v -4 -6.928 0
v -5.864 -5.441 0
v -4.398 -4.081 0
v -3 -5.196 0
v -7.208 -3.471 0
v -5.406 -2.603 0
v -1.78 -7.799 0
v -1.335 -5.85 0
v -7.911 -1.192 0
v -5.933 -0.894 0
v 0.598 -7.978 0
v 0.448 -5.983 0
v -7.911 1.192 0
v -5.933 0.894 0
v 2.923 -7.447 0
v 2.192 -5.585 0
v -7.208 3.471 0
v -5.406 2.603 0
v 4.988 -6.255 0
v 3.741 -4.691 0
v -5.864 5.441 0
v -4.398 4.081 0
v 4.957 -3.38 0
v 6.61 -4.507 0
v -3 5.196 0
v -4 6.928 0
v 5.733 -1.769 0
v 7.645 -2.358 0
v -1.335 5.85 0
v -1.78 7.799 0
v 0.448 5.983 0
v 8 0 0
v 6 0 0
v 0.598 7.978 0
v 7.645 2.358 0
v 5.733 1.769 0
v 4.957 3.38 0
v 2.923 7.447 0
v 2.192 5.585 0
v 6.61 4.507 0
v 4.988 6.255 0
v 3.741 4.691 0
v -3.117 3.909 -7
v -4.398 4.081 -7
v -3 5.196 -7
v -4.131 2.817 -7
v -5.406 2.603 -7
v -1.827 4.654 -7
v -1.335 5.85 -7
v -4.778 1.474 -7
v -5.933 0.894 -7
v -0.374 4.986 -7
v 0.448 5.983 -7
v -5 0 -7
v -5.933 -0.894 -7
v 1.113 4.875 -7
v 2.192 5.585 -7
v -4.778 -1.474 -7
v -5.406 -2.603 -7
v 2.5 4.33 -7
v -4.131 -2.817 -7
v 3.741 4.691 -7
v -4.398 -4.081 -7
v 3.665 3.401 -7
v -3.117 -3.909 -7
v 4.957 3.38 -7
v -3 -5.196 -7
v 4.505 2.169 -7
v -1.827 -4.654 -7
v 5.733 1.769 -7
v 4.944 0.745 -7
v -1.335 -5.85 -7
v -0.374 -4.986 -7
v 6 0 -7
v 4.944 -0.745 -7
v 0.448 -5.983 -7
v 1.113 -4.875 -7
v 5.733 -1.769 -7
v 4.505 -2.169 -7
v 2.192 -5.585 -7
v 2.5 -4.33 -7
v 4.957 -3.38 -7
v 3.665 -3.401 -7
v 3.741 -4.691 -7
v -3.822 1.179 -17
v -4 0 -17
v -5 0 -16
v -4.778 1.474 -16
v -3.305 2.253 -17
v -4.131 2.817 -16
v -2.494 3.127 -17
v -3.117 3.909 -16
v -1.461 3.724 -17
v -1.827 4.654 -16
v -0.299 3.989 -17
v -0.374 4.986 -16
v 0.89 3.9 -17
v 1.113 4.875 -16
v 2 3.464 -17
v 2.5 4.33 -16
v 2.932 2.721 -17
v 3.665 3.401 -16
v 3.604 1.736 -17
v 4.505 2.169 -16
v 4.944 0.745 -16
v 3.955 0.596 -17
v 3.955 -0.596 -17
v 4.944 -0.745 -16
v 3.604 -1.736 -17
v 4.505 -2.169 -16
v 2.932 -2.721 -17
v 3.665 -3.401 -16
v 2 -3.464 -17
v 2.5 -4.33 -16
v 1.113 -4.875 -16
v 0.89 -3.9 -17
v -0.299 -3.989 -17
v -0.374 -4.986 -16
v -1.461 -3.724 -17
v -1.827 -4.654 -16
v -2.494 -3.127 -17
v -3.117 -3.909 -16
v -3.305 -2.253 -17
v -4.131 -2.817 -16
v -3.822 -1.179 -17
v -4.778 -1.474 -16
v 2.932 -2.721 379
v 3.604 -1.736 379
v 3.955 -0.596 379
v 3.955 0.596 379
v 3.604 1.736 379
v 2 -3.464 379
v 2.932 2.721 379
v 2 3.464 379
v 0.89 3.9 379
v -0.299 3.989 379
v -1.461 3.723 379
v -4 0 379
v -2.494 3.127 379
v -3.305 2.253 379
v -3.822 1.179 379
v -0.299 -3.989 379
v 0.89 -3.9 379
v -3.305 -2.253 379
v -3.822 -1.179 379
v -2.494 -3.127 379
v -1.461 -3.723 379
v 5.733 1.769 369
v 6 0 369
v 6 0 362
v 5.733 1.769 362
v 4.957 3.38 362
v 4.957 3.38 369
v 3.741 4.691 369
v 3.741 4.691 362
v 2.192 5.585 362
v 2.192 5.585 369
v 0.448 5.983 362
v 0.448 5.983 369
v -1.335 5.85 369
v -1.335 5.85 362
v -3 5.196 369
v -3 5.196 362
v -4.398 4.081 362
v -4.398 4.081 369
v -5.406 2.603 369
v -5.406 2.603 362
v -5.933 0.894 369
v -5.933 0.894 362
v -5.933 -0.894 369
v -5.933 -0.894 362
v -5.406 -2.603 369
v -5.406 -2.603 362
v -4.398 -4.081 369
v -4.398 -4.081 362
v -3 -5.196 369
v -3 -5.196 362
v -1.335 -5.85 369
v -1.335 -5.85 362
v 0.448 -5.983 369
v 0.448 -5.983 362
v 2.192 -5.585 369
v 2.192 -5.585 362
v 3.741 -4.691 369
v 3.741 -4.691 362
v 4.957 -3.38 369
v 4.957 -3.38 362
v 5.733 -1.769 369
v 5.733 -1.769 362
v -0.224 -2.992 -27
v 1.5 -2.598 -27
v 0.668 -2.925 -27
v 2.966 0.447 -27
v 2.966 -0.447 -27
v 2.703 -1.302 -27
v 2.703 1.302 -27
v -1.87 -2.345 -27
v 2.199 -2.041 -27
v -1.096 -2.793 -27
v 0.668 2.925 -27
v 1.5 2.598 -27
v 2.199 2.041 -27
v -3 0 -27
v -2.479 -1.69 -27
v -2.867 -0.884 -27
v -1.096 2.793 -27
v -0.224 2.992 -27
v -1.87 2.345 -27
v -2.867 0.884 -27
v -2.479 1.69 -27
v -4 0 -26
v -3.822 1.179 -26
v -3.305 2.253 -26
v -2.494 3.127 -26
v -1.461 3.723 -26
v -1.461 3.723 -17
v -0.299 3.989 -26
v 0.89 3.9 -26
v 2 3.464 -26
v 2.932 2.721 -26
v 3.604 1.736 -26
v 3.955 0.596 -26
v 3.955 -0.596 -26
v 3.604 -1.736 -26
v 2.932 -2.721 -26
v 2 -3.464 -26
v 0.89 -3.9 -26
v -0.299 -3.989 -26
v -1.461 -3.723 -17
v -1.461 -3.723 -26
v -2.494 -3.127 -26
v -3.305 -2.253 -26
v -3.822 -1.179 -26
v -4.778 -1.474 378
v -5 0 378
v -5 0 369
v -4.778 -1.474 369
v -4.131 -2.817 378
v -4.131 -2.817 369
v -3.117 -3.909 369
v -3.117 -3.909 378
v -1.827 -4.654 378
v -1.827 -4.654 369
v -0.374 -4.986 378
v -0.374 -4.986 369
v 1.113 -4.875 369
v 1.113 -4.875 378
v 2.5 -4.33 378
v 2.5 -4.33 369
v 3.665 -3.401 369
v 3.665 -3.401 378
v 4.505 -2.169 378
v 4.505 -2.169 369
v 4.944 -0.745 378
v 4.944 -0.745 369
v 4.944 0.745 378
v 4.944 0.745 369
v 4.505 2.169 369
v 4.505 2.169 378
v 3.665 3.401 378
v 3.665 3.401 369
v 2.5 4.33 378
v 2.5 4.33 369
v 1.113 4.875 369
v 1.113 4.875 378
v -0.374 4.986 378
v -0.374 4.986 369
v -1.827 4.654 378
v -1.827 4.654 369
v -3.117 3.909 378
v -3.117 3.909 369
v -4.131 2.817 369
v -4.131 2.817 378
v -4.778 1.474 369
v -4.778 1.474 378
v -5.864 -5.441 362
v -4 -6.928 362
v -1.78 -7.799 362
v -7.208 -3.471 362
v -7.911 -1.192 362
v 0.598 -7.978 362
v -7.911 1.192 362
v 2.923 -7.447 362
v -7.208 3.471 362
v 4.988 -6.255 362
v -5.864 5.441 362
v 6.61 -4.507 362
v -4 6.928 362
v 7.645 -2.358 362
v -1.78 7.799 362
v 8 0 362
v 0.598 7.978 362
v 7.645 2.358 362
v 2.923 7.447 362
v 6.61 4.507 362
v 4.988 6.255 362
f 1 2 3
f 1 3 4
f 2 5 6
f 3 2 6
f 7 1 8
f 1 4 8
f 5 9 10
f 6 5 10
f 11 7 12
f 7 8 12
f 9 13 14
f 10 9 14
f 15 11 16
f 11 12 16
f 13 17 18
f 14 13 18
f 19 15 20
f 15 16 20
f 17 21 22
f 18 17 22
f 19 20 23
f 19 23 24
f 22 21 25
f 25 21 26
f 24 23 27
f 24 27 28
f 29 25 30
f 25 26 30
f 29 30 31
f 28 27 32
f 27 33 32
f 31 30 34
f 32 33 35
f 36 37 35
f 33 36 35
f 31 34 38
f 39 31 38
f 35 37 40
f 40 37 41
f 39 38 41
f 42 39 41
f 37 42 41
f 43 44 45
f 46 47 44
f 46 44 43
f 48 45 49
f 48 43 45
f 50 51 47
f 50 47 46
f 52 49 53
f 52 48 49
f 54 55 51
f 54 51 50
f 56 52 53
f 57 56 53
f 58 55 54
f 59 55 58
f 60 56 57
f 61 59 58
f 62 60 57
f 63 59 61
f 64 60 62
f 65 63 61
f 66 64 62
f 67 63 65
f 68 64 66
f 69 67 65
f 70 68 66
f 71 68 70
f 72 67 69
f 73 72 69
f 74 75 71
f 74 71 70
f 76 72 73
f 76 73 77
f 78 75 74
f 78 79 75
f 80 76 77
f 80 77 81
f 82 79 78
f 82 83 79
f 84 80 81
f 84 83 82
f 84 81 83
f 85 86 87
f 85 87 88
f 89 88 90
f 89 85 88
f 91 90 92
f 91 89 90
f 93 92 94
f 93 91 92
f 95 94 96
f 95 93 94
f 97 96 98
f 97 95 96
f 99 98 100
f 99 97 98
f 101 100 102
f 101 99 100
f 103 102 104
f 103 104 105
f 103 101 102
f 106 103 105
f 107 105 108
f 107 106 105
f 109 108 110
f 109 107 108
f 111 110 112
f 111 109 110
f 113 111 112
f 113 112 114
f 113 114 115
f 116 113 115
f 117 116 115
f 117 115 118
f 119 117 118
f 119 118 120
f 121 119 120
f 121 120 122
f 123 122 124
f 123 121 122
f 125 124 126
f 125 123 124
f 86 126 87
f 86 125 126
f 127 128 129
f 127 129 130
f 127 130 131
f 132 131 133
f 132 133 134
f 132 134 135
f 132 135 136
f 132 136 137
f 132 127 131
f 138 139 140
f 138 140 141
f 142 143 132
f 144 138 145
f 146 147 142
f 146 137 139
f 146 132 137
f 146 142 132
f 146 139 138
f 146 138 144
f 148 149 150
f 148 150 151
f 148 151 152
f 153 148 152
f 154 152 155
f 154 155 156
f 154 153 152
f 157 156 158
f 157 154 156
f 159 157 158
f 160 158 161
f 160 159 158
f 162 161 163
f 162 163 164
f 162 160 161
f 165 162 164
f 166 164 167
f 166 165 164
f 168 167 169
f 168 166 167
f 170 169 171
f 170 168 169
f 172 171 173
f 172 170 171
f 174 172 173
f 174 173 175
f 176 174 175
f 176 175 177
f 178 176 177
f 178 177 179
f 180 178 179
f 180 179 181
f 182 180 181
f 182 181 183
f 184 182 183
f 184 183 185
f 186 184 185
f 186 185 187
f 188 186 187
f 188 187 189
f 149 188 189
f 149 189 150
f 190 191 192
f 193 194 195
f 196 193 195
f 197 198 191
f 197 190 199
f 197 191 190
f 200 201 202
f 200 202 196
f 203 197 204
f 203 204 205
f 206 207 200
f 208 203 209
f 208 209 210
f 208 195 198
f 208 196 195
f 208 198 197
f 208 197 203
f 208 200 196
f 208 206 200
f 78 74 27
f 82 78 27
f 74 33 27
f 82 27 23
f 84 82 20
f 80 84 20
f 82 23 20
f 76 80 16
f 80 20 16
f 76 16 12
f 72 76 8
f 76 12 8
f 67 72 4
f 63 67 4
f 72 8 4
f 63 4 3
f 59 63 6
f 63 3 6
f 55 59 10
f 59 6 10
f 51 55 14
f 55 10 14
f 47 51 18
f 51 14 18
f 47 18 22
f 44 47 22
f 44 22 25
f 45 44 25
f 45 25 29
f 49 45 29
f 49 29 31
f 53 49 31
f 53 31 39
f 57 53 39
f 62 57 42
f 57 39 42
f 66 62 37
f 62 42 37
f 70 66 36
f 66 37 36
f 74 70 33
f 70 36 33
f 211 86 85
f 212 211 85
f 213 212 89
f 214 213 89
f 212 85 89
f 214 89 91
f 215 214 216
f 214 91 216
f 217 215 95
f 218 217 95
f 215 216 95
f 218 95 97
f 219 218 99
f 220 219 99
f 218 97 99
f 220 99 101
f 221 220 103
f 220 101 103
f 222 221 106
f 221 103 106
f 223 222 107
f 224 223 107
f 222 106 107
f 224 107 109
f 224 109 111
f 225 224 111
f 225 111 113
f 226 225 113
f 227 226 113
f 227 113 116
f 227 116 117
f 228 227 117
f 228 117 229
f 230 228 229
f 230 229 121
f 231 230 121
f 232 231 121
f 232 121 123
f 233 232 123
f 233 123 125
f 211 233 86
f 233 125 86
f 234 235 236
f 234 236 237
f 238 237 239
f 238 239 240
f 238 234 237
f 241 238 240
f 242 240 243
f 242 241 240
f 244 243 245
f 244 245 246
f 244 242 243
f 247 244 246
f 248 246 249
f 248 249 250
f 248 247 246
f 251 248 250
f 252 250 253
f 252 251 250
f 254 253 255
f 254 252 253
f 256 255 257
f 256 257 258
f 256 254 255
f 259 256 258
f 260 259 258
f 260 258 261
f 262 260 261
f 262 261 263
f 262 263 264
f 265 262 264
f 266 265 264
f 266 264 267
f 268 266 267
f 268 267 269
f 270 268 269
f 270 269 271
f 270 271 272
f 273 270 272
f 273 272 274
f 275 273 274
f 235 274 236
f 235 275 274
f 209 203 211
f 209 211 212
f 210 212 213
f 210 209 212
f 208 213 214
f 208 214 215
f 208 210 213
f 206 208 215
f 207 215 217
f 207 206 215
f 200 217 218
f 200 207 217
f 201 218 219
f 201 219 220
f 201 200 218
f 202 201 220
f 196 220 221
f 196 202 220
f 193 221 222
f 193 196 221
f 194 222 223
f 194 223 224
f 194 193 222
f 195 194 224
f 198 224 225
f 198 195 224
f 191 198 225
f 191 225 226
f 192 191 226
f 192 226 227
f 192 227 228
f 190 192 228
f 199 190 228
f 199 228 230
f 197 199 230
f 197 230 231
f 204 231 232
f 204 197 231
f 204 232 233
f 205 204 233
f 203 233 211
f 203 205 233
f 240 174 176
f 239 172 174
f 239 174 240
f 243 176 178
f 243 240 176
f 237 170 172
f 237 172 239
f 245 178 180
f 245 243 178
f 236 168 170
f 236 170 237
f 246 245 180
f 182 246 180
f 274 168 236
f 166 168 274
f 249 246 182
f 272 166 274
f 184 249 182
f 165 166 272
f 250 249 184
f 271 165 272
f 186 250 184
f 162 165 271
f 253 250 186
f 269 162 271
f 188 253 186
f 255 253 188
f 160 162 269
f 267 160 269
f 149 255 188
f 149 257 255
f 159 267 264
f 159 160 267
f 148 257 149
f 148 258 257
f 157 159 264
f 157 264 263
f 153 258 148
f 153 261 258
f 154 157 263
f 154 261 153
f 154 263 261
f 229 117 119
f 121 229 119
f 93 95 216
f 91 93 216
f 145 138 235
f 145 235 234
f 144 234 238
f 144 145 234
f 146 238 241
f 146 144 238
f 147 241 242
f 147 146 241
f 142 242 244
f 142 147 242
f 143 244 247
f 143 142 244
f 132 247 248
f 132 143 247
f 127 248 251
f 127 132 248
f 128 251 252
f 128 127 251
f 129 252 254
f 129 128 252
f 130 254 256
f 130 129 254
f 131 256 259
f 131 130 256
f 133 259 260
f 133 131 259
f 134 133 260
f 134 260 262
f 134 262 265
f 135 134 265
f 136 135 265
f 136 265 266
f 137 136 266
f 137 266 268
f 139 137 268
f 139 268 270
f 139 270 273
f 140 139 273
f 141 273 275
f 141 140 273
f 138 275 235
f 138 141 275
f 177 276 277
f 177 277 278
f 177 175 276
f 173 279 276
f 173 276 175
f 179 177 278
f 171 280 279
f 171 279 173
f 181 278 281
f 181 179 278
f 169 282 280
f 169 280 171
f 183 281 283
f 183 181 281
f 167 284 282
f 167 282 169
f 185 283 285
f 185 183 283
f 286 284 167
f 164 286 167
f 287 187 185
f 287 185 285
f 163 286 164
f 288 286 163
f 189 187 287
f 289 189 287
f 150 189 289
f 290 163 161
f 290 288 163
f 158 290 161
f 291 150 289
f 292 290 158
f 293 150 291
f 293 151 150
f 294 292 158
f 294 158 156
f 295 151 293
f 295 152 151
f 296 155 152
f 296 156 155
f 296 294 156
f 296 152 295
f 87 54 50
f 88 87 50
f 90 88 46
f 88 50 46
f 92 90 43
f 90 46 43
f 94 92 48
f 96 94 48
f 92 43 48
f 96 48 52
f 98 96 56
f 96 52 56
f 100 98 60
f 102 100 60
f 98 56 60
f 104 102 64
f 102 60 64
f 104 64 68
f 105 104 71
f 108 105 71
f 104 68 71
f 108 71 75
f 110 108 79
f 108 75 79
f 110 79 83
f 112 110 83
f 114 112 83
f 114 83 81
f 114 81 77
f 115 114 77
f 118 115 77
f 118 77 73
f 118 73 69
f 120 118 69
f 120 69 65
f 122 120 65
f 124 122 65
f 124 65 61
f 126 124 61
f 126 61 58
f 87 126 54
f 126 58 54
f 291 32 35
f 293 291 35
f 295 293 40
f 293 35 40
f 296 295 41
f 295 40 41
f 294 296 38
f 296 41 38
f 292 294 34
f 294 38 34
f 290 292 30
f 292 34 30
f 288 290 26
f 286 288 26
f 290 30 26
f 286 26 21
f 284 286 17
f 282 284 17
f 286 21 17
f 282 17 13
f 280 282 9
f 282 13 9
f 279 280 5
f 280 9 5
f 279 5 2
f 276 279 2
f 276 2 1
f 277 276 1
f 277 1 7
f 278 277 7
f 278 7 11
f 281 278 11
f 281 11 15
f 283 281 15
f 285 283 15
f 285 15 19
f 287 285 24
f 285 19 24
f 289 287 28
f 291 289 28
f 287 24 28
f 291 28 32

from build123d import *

# Parameters (mm, degrees)
SKETCH1_R           = 8
BOSS_EXTRUDE1_DEPTH = 362
SKETCH6_R           = 6
BOSS_EXTRUDE2_DEPTH = 5
SKETCH7_R           = 6
BOSS_EXTRUDE3_DEPTH = 2
SKETCH8_R           = 5
BOSS_EXTRUDE4_DEPTH = 10
SKETCH9_R           = 4
BOSS_EXTRUDE5_DEPTH = 10
CHAMFER1_SIZE       = 1
CHAMFER2_SIZE       = 1
BOSS_EXTRUDE6_START = 5
SKETCH10_R          = 6
BOSS_EXTRUDE6_DEPTH = 5
BOSS_EXTRUDE7_START = 2
SKETCH11_R          = 6
BOSS_EXTRUDE7_DEPTH = 2
BOSS_EXTRUDE8_START = 10
SKETCH12_R          = 5
BOSS_EXTRUDE8_DEPTH = 10
CHAMFER3_SIZE       = 1


with BuildPart() as part:
    # Sketch1 → Boss-Extrude1 (new body)
    with BuildSketch(Plane.XY):
        Circle(SKETCH1_R)
    extrude(amount=BOSS_EXTRUDE1_DEPTH)

    # Sketch6 → Boss-Extrude2 (add)
    with BuildSketch(Plane(origin=(0, 0, 0), x_dir=(-1, 0, 0), z_dir=(0, 0, -1))):
        with Locations(Location((0, 0, 0), (0, 0, 180))):
            Circle(SKETCH6_R)
    extrude(amount=BOSS_EXTRUDE2_DEPTH)

    # Sketch7 → Boss-Extrude3 (add)
    with BuildSketch(Plane(origin=(0, 0, -5), x_dir=(-1, 0, 0), z_dir=(0, 0, -1))):
        with Locations(Location((0, 0, 0), (0, 0, 180))):
            Circle(SKETCH7_R)
    extrude(amount=BOSS_EXTRUDE3_DEPTH)

    # Sketch8 → Boss-Extrude4 (add)
    with BuildSketch(Plane(origin=(0, 0, -7), x_dir=(-1, 0, 0), z_dir=(0, 0, -1))):
        Circle(SKETCH8_R)
    extrude(amount=BOSS_EXTRUDE4_DEPTH)

    # Sketch9 → Boss-Extrude5 (add)
    with BuildSketch(Plane(origin=(0, 0, -17), x_dir=(-1, 0, 0), z_dir=(0, 0, -1))):
        Circle(SKETCH9_R)
    extrude(amount=BOSS_EXTRUDE5_DEPTH)

    # Chamfer1
    chamfer1_edges = [part.edges().sort_by_distance(p)[0] for p in [
        (5, 0, -17),
    ]]
    chamfer(chamfer1_edges, length=CHAMFER1_SIZE - 0.0001)  # a hair under: the kernel refuses the full size

    # Chamfer2
    chamfer2_edges = [part.edges().sort_by_distance(p)[0] for p in [
        (4, 0, -27),
    ]]
    chamfer(chamfer2_edges, length=CHAMFER2_SIZE)

    # Sketch10 → Boss-Extrude6 (add)
    with BuildSketch(Plane.XY.offset(362).offset(BOSS_EXTRUDE6_START)):
        Circle(SKETCH10_R)
    extrude(amount=-BOSS_EXTRUDE6_DEPTH)

    # Sketch11 → Boss-Extrude7 (add)
    with BuildSketch(Plane.XY.offset(367).offset(BOSS_EXTRUDE7_START)):
        Circle(SKETCH11_R)
    extrude(amount=-BOSS_EXTRUDE7_DEPTH)

    # Sketch12 → Boss-Extrude8 (add)
    with BuildSketch(Plane.XY.offset(369).offset(BOSS_EXTRUDE8_START)):
        with Locations(Location((0, 0, 0), (0, 0, 180))):
            Circle(SKETCH12_R)
    extrude(amount=-BOSS_EXTRUDE8_DEPTH)

    # Chamfer3
    chamfer3_edges = [part.edges().sort_by_distance(p)[0] for p in [
        (5, 0, 379),
    ]]
    chamfer(chamfer3_edges, length=CHAMFER3_SIZE)


solid = part.part
